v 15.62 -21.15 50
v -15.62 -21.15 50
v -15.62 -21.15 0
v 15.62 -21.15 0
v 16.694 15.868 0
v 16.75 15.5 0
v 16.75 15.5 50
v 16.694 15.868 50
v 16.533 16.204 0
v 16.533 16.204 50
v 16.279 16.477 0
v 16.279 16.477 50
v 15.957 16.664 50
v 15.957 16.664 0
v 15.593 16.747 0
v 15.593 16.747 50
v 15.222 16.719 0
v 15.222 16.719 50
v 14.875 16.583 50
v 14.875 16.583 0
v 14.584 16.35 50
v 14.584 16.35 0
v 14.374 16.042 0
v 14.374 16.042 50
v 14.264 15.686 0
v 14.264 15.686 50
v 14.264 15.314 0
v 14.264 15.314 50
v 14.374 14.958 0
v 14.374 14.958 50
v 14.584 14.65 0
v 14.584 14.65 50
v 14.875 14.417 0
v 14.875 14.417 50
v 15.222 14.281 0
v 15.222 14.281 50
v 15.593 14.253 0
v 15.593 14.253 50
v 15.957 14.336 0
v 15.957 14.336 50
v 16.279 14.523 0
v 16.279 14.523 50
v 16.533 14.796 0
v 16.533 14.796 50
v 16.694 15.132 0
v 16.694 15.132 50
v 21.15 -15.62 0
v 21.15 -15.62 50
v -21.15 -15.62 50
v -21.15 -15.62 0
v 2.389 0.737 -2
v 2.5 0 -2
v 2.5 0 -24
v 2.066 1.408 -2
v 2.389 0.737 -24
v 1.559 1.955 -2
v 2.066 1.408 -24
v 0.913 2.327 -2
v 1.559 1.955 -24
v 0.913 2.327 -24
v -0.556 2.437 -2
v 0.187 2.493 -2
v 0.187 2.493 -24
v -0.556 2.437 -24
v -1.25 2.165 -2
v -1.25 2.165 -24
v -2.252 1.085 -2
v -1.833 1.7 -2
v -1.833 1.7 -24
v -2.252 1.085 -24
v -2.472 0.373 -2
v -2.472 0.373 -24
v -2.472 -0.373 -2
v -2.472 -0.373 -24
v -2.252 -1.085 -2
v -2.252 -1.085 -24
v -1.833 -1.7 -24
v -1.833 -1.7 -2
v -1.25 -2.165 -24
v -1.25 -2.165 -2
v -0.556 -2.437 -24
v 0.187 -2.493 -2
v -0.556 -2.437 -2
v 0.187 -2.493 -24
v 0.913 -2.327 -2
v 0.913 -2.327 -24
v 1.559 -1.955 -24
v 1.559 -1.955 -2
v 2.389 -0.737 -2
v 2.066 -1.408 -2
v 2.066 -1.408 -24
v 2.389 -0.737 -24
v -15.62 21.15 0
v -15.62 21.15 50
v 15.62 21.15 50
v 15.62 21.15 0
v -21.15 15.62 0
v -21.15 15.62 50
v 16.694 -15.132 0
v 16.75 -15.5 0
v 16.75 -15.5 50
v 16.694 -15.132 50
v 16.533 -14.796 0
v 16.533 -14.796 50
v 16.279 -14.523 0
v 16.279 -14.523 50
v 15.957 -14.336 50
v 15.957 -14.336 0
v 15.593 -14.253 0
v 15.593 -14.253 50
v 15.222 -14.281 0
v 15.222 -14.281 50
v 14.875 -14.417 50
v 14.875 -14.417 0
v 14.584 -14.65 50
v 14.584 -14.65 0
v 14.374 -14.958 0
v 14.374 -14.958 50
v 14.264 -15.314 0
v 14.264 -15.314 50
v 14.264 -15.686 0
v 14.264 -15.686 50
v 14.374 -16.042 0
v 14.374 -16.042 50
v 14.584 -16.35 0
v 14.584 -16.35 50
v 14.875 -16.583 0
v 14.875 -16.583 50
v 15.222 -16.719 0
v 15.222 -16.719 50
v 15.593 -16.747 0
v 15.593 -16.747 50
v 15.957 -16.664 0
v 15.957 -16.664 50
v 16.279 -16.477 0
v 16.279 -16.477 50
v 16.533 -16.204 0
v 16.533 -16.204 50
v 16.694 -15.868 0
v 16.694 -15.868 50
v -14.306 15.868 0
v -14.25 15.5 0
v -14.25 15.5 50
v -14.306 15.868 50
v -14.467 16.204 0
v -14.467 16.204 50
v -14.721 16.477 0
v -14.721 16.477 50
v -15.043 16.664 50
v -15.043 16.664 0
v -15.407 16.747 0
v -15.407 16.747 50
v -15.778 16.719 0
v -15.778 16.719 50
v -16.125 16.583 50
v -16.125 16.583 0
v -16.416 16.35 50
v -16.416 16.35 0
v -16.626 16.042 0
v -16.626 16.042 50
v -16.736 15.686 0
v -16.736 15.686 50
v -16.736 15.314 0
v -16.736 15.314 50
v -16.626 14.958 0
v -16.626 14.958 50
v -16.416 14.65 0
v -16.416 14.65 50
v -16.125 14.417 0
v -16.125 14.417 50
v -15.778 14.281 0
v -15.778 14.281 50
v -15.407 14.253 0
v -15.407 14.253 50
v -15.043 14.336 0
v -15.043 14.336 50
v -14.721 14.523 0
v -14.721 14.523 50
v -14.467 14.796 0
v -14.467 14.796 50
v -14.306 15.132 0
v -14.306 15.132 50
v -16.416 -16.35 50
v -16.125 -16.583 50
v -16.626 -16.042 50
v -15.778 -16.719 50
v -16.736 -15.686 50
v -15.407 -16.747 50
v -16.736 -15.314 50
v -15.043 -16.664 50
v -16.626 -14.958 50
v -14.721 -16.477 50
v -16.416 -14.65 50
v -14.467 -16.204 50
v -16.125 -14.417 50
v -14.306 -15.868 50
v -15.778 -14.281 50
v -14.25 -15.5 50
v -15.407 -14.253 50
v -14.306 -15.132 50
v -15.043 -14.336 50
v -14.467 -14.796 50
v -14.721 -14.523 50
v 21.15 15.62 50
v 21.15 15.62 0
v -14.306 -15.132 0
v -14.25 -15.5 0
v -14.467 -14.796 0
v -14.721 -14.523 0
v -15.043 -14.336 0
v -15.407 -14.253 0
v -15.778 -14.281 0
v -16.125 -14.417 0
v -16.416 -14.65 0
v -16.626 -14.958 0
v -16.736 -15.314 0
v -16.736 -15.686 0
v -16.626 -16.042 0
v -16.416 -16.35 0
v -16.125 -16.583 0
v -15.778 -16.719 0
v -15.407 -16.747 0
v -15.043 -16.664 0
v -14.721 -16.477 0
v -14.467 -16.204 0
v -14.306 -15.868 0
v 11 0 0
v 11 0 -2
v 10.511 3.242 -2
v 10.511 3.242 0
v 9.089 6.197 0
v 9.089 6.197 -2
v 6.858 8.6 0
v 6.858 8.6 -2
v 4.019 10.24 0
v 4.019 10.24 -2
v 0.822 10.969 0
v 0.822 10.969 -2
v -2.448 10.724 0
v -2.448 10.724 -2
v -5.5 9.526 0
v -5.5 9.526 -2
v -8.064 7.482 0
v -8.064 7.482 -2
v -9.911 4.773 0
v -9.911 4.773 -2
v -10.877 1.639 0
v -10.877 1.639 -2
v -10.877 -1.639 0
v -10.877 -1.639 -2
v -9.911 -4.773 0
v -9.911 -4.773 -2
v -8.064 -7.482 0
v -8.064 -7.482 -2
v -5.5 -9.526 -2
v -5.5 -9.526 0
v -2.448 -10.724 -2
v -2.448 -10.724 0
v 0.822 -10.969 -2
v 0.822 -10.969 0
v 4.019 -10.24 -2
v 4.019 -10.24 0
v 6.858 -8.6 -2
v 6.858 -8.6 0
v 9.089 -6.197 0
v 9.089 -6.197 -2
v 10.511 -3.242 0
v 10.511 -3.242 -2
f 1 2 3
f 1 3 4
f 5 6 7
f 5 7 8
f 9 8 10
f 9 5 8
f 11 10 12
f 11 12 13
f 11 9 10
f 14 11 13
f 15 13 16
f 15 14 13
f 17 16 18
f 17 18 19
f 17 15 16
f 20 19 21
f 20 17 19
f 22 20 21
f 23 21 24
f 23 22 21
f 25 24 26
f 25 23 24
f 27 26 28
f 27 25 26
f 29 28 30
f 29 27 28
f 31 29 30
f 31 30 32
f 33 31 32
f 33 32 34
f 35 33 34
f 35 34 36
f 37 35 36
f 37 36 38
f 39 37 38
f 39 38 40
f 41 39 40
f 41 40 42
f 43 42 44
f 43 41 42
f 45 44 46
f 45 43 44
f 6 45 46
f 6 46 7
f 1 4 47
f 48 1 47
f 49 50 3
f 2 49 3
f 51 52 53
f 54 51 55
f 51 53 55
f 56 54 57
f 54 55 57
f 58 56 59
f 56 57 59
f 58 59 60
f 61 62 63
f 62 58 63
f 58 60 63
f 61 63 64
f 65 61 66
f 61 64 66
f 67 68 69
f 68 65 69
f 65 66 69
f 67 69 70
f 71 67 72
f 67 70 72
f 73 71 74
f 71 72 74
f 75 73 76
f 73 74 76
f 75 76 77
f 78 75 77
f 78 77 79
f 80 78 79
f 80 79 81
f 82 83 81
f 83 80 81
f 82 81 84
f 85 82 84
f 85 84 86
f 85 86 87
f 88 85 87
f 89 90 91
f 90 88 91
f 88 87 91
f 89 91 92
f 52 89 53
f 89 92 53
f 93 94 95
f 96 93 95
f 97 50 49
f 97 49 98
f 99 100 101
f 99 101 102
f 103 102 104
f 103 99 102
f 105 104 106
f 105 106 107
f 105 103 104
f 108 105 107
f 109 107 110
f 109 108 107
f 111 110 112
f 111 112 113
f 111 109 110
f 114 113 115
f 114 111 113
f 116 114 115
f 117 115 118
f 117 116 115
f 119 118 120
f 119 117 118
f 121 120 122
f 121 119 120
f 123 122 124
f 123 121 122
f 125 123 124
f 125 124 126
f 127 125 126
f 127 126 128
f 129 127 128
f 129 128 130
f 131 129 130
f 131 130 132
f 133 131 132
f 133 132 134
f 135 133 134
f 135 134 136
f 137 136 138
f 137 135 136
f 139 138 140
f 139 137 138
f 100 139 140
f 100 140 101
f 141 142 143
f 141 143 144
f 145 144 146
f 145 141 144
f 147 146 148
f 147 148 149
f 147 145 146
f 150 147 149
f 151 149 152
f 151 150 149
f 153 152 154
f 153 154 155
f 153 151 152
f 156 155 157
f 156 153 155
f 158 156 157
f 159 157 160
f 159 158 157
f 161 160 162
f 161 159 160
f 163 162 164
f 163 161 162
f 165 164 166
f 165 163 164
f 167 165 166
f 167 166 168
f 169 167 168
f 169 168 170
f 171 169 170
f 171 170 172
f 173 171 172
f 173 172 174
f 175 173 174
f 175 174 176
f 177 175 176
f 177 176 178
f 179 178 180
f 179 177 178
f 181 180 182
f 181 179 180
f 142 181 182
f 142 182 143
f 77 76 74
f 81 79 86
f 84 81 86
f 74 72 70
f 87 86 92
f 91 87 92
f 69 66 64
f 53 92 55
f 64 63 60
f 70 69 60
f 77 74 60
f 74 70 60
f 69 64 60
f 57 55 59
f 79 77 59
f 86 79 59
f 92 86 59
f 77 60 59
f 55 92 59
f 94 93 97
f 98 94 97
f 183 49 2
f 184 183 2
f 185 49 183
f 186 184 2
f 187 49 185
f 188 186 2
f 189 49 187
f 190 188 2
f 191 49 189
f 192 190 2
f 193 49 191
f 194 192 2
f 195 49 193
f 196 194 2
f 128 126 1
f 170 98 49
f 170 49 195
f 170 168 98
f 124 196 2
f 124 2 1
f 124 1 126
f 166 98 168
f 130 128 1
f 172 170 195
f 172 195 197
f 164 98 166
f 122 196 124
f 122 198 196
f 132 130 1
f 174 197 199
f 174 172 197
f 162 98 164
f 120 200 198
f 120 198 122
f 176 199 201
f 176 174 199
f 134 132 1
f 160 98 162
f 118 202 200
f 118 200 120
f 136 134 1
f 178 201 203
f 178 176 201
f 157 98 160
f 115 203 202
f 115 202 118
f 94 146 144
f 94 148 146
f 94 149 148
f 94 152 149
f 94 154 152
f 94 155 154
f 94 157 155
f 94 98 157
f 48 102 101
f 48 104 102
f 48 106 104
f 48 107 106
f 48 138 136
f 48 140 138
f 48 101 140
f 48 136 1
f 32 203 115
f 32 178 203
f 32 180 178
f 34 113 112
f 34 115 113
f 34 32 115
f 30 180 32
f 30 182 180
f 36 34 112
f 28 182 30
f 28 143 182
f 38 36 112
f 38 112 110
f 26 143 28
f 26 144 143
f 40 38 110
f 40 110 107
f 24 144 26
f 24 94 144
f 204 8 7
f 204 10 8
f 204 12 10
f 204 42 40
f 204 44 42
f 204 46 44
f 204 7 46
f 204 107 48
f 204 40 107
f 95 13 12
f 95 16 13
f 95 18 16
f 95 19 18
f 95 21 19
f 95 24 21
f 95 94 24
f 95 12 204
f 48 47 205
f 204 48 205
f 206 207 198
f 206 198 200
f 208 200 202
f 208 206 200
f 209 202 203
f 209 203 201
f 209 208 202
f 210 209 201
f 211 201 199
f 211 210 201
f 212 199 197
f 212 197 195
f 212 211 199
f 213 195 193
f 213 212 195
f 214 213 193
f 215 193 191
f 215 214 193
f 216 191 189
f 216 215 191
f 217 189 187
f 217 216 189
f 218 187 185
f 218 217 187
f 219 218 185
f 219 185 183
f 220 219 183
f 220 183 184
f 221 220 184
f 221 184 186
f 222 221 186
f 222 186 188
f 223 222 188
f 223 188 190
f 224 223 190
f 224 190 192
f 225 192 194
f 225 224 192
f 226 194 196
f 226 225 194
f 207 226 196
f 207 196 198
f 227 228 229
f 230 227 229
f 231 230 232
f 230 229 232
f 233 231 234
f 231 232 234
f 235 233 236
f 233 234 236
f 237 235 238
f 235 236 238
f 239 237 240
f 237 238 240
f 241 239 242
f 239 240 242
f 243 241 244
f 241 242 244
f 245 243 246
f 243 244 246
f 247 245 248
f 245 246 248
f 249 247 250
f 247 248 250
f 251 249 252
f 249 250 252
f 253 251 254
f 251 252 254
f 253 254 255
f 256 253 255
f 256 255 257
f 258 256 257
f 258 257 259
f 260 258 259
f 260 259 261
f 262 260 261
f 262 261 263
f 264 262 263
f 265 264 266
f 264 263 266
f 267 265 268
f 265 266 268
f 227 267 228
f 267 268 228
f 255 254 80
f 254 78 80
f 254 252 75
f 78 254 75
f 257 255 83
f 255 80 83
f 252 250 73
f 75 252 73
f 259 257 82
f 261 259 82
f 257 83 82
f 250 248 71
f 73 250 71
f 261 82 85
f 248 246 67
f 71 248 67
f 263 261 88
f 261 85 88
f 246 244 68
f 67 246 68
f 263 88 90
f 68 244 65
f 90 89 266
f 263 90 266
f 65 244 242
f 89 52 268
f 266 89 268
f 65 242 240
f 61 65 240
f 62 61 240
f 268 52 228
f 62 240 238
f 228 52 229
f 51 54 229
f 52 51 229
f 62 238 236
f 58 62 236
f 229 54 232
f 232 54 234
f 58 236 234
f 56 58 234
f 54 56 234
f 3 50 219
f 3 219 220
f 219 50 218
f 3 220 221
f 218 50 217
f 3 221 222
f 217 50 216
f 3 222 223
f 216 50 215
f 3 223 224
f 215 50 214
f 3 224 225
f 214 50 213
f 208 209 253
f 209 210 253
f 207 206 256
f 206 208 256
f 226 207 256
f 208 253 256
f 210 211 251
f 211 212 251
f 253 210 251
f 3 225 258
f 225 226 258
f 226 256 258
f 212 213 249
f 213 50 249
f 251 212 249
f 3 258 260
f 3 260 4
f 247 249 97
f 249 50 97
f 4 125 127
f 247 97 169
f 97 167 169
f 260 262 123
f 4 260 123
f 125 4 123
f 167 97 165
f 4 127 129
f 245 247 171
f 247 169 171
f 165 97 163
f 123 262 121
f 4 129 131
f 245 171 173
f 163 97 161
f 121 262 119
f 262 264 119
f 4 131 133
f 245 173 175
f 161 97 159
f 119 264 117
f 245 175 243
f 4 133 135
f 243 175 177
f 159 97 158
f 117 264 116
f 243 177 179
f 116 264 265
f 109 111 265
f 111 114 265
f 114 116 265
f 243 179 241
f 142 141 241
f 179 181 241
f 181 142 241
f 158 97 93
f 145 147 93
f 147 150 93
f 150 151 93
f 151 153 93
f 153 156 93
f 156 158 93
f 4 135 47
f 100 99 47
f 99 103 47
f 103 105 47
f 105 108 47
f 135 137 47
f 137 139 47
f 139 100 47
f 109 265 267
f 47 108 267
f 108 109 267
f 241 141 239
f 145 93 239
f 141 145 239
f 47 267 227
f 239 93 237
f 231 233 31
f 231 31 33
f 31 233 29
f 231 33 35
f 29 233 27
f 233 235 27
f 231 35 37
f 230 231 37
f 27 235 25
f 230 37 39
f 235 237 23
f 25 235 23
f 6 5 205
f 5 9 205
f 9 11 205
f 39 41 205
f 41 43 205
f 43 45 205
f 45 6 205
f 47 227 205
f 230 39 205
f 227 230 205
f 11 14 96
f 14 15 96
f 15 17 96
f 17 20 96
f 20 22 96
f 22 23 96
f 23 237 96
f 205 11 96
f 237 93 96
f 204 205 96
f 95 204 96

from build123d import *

# Parameters (mm, degrees)
BOX002_W                    = 100
BOX002_H                    = 100
BOX002_DEPTH                = 50
COMPOUND002_PLACEMENT_ANGLE = 135
BOX003_W                    = 100
BOX003_H                    = 100
BOX003_DEPTH                = 50
COMPOUND003_PLACEMENT_ANGLE = 225
BOX004_W                    = 100
BOX004_H                    = 100
BOX004_DEPTH                = 50
COMPOUND004_PLACEMENT_ANGLE = 315
BOX001_W                    = 100
BOX001_H                    = 100
BOX001_DEPTH                = 50
COMPOUND001_PLACEMENT_ANGLE = 45
CYLINDER002_R               = 1.25
CYLINDER002_DEPTH           = 50
CYLINDER003_R               = 1.25
CYLINDER003_DEPTH           = 50
CYLINDER004_R               = 1.25
CYLINDER004_DEPTH           = 50
CYLINDER005_R               = 1.25
CYLINDER005_DEPTH           = 50
BOX_W                       = 42.3
BOX_H                       = 42.3
BOX_DEPTH                   = 50
CYLINDER_R                  = 11
CYLINDER_DEPTH              = 2
CYLINDER001_R               = 2.5
CYLINDER001_DEPTH           = 24


with BuildPart() as compound002:
    # Box002 → Box002 (new body)
    with BuildSketch(Plane(origin=(26, -50, 0), x_dir=(1, 0, 0), z_dir=(0, 0, 1))):
        with Locations((50, 50)):
            Rectangle(BOX002_W, BOX002_H)
    extrude(amount=BOX002_DEPTH)


with BuildPart() as compound002_1:
    # Compound002 placement: moved
    add(compound002.part.rotate(Axis((0, 0, 0), (0, 0, 1)), COMPOUND002_PLACEMENT_ANGLE))


with BuildPart() as compound003:
    # Box003 → Box003 (new body)
    with BuildSketch(Plane(origin=(26, -50, 0), x_dir=(1, 0, 0), z_dir=(0, 0, 1))):
        with Locations((50, 50)):
            Rectangle(BOX003_W, BOX003_H)
    extrude(amount=BOX003_DEPTH)


with BuildPart() as compound003_1:
    # Compound003 placement: moved
    add(compound003.part.rotate(Axis((0, 0, 0), (0, 0, 1)), COMPOUND003_PLACEMENT_ANGLE))


with BuildPart() as compound004:
    # Box004 → Box004 (new body)
    with BuildSketch(Plane(origin=(26, -50, 0), x_dir=(1, 0, 0), z_dir=(0, 0, 1))):
        with Locations((50, 50)):
            Rectangle(BOX004_W, BOX004_H)
    extrude(amount=BOX004_DEPTH)


with BuildPart() as compound004_1:
    # Compound004 placement: moved
    add(compound004.part.rotate(Axis((0, 0, 0), (0, 0, 1)), COMPOUND004_PLACEMENT_ANGLE))


with BuildPart() as compound005:
    # Box001 → Box001 (new body)
    with BuildSketch(Plane(origin=(26, -50, 0), x_dir=(1, 0, 0), z_dir=(0, 0, 1))):
        with Locations((50, 50)):
            Rectangle(BOX001_W, BOX001_H)
    extrude(amount=BOX001_DEPTH)


with BuildPart() as compound005_1:
    # Compound001 placement: moved
    add(compound005.part.rotate(Axis((0, 0, 0), (0, 0, 1)), COMPOUND001_PLACEMENT_ANGLE))

    # Compound005: union Compound002, Compound003, Compound004
    add(compound002_1.part)
    add(compound003_1.part)
    add(compound004_1.part)


with BuildPart() as cylinder002:
    # Cylinder002 → Cylinder002 (new body)
    with BuildSketch(Plane(origin=(15.5, 15.5, 0), x_dir=(1, 0, 0), z_dir=(0, 0, 1))):
        Circle(CYLINDER002_R)
    extrude(amount=CYLINDER002_DEPTH)


with BuildPart() as cylinder003:
    # Cylinder003 → Cylinder003 (new body)
    with BuildSketch(Plane(origin=(-15.5, 15.5, 0), x_dir=(1, 0, 0), z_dir=(0, 0, 1))):
        Circle(CYLINDER003_R)
    extrude(amount=CYLINDER003_DEPTH)


with BuildPart() as cylinder004:
    # Cylinder004 → Cylinder004 (new body)
    with BuildSketch(Plane(origin=(15.5, -15.5, 0), x_dir=(1, 0, 0), z_dir=(0, 0, 1))):
        Circle(CYLINDER004_R)
    extrude(amount=CYLINDER004_DEPTH)


with BuildPart() as compound:
    # Cylinder005 → Cylinder005 (new body)
    with BuildSketch(Plane(origin=(-15.5, -15.5, 0), x_dir=(1, 0, 0), z_dir=(0, 0, 1))):
        Circle(CYLINDER005_R)
    extrude(amount=CYLINDER005_DEPTH)

    # Compound: union Cylinder002, Cylinder003, Cylinder004
    add(cylinder002.part)
    add(cylinder003.part)
    add(cylinder004.part)


with BuildPart() as cube:
    # Box → Box (new body)
    with BuildSketch(Plane(origin=(-21.15, -21.15, 0), x_dir=(1, 0, 0), z_dir=(0, 0, 1))):
        with Locations((21.15, 21.15)):
            Rectangle(BOX_W, BOX_H)
    extrude(amount=BOX_DEPTH)


with BuildPart() as fusion:
    # Cylinder → Cylinder (new body)
    with BuildSketch(Plane.XY.offset(-2)):
        Circle(CYLINDER_R)
    extrude(amount=CYLINDER_DEPTH)

    # Fusion: union Cube
    add(cube.part)


with BuildPart() as cut001:
    # Cylinder001 → Cylinder001 (new body)
    with BuildSketch(Plane.XY.offset(-24)):
        Circle(CYLINDER001_R)
    extrude(amount=CYLINDER001_DEPTH)

    # Fusion001: union Fusion
    add(fusion.part)

    # Cut: cut Compound
    add(compound.part, mode=Mode.SUBTRACT)

    # Cut001: cut Compound005
    add(compound005_1.part, mode=Mode.SUBTRACT)


solid = cut001.part
